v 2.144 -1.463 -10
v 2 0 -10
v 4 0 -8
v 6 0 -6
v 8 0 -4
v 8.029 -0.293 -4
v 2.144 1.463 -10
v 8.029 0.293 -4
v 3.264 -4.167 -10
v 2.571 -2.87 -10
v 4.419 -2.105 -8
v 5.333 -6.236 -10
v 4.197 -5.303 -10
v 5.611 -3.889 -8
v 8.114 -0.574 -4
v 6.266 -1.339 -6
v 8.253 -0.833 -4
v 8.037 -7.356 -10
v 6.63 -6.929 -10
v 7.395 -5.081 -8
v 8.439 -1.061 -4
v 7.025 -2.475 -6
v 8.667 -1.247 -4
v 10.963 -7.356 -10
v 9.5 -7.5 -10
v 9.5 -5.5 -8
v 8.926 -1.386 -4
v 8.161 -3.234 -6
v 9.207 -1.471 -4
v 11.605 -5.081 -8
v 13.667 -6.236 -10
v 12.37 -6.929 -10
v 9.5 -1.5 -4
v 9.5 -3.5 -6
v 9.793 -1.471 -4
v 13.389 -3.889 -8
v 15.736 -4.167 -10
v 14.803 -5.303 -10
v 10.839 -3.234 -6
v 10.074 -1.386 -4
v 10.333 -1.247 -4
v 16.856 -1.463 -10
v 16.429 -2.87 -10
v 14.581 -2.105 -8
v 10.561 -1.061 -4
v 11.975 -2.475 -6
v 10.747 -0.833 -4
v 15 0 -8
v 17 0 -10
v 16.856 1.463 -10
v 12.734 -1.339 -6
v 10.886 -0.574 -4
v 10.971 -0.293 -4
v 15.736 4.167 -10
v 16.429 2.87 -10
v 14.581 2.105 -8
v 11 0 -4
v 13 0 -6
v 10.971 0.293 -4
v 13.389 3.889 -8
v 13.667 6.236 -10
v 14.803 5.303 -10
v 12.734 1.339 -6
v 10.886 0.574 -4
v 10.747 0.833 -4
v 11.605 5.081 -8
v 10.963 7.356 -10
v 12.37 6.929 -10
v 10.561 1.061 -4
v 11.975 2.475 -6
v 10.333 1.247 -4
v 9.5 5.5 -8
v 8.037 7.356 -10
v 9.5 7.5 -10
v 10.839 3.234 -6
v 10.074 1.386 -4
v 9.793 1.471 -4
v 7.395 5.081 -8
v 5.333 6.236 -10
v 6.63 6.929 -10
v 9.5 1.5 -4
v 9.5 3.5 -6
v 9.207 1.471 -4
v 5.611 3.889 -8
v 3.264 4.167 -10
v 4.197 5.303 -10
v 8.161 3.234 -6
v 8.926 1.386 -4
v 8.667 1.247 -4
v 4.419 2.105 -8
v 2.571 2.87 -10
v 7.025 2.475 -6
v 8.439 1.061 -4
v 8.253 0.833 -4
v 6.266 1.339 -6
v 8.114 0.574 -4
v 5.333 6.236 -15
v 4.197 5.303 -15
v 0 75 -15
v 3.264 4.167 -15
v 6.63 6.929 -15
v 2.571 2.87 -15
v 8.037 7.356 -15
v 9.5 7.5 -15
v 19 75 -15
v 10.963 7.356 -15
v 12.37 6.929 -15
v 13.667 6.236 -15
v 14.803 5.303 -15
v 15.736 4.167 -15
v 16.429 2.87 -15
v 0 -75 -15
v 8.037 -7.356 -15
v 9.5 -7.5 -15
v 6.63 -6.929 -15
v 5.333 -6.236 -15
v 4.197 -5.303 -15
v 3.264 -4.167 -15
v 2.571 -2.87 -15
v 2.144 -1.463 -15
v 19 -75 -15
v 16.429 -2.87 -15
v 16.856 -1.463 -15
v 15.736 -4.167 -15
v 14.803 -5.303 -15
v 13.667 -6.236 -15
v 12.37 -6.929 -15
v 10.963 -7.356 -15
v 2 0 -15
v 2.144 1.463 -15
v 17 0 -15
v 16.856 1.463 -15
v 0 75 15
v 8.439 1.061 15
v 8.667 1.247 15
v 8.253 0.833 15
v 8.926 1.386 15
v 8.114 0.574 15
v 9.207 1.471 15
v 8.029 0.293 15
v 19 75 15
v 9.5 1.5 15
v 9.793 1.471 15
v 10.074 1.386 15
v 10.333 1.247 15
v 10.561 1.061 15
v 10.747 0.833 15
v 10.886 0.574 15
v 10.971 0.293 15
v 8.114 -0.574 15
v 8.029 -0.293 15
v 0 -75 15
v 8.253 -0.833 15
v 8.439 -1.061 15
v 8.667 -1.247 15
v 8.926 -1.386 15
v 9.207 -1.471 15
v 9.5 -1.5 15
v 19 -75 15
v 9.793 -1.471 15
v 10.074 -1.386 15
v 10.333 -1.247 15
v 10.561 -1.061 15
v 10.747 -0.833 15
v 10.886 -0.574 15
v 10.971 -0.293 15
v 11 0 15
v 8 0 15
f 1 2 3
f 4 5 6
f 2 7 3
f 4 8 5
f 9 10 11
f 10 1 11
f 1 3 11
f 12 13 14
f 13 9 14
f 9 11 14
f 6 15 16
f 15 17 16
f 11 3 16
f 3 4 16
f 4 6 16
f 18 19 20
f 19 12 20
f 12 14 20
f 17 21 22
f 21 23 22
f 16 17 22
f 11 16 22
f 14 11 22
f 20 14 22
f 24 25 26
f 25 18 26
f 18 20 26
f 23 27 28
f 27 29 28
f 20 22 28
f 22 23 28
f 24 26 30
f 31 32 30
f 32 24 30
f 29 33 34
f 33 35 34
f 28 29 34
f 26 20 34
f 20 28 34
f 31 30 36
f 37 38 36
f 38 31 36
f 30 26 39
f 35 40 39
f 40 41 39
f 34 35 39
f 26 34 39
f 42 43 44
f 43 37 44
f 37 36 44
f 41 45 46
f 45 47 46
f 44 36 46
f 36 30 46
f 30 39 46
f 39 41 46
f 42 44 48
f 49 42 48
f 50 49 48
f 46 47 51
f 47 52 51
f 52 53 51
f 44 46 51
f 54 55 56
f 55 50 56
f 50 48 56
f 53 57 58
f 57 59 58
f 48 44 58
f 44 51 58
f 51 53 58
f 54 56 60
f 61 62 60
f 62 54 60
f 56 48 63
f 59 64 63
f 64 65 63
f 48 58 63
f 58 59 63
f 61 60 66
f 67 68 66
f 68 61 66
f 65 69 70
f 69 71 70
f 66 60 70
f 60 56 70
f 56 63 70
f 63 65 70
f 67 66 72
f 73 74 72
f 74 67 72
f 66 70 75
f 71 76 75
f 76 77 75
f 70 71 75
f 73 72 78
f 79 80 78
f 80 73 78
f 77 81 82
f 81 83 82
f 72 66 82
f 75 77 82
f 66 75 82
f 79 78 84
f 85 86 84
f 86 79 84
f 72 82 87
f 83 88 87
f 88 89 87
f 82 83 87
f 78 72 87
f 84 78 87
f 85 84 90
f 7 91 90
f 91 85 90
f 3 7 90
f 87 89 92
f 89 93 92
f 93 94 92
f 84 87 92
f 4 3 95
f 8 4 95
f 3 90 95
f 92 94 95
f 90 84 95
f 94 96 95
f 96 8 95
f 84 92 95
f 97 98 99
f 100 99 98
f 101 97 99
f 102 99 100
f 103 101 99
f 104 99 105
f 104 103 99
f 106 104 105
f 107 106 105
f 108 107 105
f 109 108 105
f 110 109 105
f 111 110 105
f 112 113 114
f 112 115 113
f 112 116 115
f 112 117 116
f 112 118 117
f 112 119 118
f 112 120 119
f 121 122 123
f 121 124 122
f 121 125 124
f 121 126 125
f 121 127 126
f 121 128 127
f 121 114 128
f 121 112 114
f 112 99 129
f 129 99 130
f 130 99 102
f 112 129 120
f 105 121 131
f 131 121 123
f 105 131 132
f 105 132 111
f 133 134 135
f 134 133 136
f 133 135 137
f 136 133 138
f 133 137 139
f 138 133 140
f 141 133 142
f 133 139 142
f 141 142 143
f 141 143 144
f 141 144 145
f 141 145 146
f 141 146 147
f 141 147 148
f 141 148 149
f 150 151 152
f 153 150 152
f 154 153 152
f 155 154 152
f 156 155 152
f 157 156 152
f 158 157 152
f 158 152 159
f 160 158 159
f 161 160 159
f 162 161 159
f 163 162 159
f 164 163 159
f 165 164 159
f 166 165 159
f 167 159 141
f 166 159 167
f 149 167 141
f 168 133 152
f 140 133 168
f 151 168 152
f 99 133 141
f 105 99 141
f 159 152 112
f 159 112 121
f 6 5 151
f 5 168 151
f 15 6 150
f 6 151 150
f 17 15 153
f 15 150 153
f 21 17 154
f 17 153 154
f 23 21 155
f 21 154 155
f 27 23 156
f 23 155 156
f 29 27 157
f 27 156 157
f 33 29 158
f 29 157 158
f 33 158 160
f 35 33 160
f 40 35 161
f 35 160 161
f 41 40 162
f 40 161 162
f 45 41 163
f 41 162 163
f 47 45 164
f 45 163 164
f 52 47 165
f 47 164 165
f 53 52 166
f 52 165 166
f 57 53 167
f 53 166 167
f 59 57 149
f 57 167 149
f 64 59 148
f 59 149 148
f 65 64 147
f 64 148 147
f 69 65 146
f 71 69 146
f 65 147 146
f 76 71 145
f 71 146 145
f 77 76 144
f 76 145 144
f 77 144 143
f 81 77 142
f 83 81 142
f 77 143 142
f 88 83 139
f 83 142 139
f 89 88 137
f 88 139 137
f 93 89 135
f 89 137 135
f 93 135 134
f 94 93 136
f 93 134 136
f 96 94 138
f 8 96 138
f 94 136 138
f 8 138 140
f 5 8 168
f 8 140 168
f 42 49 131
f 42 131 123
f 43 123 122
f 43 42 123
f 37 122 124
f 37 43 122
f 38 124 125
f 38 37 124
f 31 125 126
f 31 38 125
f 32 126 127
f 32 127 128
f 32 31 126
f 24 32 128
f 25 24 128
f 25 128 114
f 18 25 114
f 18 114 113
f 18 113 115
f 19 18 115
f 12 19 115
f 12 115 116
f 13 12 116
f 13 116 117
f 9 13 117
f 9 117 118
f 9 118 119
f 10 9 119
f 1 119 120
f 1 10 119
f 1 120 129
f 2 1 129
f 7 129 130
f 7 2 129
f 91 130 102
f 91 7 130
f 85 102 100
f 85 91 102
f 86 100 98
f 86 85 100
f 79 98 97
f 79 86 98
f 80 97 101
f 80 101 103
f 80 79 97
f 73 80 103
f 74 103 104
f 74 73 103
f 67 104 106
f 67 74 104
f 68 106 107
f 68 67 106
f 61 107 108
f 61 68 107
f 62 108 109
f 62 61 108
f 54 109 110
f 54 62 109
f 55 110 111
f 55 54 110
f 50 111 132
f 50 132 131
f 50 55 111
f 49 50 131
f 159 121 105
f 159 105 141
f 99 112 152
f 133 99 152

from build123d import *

# Parameters (mm, degrees)
F1_W           = 19
F1_H           = 30
F2_DEPTH       = 75
F4_R           = 7.5
F5_DEPTH       = 5
F6_D           = 3
F6_CSINK_D     = 15
F6_CSINK_ANGLE = 90


with BuildPart() as f2:
    # F1 (on Front) → F2 (new body, symmetric)
    with BuildSketch(Plane.XZ):
        with Locations((9.5, 0)):
            Rectangle(F1_W, F1_H)
    extrude(amount=F2_DEPTH, both=True)

    # F4 (on offset) → F5 (cut, through all)
    with BuildSketch(Plane(origin=(0, 0, -10), x_dir=(1, 0, 0), z_dir=(0, 0, -1))):
        with Locations((9.5, 0)):
            Circle(F4_R)
    extrude(amount=F5_DEPTH, mode=Mode.SUBTRACT)

    # F6 (through all)
    with Locations(Plane(origin=(0, 0, -10), x_dir=(1, 0, 0), z_dir=(0, 0, -1))):
        with Locations((9.5, 0)):
            CounterSinkHole(F6_D / 2, F6_CSINK_D / 2, counter_sink_angle=F6_CSINK_ANGLE)


solid = f2.part
